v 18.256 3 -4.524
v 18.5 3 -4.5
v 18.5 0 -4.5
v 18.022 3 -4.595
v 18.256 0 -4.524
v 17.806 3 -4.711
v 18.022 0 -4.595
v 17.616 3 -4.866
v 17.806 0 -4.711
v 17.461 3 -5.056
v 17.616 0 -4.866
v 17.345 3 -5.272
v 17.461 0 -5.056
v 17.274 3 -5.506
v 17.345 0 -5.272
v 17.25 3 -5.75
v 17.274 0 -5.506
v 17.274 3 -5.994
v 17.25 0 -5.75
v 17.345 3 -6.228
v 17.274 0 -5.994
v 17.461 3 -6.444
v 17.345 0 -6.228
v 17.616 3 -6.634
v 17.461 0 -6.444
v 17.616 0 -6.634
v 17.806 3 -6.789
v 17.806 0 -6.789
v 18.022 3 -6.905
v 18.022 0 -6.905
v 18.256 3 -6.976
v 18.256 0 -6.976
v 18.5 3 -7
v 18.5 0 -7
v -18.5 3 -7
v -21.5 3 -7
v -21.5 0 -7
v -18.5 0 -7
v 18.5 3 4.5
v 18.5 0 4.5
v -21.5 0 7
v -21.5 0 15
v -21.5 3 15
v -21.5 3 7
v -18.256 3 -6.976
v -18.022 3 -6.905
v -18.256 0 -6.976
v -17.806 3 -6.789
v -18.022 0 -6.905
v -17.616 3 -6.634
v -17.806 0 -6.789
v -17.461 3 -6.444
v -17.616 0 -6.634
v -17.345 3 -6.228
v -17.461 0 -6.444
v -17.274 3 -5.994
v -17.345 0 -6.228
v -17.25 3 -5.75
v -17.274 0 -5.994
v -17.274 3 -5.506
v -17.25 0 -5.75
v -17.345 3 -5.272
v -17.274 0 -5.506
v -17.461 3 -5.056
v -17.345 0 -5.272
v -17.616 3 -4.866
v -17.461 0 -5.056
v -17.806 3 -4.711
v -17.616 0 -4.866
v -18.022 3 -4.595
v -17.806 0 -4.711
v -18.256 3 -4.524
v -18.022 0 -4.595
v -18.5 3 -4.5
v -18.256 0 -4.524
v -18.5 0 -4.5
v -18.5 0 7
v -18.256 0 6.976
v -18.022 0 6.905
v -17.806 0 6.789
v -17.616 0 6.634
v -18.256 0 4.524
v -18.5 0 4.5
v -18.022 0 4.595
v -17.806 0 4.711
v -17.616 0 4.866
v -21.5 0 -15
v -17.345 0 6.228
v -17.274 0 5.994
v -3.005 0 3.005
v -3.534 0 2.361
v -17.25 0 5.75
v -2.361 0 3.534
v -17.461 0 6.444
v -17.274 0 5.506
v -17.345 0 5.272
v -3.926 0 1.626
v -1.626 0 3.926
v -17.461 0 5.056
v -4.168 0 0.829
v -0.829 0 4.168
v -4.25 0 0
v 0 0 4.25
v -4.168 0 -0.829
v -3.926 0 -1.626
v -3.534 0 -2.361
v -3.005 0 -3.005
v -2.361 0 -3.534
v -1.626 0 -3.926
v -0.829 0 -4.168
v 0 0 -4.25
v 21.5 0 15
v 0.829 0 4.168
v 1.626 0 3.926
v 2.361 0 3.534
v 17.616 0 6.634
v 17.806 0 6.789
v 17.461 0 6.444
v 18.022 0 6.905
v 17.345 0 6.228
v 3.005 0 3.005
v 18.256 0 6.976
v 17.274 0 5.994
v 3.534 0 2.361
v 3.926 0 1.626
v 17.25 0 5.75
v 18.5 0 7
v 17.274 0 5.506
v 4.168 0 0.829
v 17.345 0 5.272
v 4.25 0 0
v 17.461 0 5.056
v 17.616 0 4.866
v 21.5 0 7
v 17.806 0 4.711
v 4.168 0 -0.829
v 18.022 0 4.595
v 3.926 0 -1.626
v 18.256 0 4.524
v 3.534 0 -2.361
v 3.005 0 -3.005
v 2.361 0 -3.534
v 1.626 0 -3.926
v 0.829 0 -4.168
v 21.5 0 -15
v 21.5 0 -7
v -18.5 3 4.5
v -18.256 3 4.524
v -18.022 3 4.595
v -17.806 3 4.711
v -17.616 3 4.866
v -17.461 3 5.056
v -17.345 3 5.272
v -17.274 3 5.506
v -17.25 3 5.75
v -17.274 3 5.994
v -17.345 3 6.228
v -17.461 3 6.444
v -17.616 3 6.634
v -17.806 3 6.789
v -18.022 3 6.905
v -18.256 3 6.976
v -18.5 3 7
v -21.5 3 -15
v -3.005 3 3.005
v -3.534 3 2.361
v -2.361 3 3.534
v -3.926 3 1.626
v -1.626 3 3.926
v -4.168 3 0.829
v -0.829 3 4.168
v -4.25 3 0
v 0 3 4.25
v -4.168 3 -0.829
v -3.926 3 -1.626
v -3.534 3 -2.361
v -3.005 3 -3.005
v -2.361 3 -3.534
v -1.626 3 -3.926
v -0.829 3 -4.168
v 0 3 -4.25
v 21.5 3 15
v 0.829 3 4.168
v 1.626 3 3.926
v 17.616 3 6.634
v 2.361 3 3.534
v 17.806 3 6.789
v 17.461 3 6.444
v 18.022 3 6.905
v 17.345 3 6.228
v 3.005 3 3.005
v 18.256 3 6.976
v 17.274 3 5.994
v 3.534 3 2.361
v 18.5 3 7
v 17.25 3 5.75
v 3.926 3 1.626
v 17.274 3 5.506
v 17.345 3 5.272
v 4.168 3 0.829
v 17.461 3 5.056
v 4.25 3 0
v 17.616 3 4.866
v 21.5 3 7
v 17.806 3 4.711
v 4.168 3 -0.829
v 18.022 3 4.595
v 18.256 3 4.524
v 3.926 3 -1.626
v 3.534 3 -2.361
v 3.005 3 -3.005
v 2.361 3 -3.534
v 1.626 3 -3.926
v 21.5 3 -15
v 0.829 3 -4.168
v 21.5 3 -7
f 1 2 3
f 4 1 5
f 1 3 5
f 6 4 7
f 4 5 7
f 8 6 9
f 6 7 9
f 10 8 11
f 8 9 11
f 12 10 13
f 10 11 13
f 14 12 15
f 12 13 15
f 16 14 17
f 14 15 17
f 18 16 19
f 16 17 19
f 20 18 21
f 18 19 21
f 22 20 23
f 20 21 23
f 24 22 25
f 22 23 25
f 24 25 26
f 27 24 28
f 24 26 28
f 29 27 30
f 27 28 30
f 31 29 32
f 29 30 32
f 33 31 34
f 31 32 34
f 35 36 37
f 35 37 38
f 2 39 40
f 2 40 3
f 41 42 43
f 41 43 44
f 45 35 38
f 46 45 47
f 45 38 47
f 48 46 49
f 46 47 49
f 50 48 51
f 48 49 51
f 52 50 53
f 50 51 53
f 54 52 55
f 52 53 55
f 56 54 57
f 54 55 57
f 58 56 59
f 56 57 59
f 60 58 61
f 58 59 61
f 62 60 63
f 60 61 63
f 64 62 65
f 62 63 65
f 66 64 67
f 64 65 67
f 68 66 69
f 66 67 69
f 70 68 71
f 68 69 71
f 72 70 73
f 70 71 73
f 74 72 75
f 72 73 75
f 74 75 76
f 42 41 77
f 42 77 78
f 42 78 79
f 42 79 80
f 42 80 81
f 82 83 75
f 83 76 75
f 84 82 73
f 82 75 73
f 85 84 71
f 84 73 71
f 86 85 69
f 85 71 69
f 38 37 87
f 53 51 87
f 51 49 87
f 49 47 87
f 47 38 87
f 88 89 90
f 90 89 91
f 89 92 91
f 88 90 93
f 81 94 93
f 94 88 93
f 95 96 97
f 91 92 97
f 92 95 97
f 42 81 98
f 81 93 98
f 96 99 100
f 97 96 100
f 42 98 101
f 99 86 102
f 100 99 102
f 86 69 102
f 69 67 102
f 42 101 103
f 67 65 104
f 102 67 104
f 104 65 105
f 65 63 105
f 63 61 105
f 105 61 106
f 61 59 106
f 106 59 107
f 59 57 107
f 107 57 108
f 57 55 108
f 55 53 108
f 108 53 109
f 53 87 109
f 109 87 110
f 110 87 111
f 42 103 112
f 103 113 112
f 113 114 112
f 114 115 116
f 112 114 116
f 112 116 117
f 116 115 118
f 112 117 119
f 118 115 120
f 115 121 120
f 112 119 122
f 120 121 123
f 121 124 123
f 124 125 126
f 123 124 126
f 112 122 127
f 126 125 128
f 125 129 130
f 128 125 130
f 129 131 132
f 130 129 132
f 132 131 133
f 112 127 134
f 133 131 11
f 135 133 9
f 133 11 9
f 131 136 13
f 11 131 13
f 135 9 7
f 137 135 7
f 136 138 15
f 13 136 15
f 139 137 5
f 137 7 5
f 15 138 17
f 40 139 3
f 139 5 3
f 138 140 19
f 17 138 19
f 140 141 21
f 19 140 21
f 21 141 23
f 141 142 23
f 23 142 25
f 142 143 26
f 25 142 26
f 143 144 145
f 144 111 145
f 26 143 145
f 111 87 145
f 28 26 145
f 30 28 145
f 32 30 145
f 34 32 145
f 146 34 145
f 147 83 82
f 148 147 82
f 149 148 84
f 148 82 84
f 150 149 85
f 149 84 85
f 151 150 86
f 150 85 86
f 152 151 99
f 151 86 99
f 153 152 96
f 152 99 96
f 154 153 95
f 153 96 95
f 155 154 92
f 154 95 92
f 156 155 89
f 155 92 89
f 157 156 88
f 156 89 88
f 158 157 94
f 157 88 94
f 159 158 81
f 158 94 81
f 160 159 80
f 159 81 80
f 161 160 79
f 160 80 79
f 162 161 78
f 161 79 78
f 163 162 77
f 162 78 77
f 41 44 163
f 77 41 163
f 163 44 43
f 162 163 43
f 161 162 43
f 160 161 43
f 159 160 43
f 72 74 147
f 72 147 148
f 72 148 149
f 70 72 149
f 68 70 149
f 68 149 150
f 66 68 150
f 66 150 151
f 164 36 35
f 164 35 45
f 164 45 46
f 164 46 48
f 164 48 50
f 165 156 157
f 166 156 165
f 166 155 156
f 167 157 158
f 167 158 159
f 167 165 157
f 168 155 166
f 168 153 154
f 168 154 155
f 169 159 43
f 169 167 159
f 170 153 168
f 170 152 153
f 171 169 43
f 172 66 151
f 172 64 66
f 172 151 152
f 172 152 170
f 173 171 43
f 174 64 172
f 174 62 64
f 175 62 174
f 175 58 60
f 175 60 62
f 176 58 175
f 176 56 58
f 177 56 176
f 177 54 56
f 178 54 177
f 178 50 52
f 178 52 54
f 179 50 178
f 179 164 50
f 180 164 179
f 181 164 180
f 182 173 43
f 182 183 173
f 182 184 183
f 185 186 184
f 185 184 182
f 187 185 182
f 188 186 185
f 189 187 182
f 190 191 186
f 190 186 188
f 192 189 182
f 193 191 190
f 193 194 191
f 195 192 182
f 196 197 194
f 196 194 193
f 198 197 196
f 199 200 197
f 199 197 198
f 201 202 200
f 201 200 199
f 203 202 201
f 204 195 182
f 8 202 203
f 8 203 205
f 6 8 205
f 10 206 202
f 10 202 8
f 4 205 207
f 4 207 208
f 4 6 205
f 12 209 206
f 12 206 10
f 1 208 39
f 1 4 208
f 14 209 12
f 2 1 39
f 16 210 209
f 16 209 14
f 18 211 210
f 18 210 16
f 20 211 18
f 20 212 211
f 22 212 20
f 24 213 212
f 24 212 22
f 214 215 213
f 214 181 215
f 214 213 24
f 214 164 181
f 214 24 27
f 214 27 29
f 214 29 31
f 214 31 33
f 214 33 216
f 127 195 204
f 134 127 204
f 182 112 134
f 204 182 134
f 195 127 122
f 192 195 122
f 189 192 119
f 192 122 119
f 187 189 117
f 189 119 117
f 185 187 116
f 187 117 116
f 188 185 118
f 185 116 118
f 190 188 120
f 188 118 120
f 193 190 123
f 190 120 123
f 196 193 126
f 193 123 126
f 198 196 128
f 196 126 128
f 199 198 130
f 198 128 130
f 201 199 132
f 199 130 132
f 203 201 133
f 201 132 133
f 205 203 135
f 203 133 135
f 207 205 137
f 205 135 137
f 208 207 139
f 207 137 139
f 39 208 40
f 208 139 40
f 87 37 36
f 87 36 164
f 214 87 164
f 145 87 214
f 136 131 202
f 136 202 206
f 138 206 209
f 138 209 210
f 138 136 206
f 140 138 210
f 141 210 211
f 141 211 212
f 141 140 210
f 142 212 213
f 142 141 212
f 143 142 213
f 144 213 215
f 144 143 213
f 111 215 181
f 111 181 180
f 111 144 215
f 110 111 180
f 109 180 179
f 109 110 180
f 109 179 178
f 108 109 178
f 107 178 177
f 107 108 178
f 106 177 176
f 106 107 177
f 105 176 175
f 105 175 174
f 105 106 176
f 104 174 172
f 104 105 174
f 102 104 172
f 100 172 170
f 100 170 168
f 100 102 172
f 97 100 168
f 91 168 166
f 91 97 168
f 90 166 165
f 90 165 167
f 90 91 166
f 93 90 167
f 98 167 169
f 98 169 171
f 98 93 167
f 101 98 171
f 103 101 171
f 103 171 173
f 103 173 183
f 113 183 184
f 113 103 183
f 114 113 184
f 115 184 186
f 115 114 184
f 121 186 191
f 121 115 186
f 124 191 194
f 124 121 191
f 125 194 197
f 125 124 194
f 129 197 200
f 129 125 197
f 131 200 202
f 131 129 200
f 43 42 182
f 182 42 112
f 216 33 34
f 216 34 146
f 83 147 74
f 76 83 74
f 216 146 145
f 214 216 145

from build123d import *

# Parameters (mm, degrees)
SKETCH_1_W          = 43
SKETCH_1_H          = 30
SKETCH_1_R          = 4.25
EXTRUDE_1_DEPTH     = 3
SKETCH_2_W          = 6
SKETCH_2_H          = 14
CUT_EXTRUDE_1_DEPTH = 3
CUT_EXTRUDE_2_REACH = 5
SKETCH_3_R          = 1.25


with BuildPart() as part:
    # 草图1 → 凸台-拉伸1 (new body)
    with BuildSketch(Plane(origin=(0, 0, 0), x_dir=(1, 0, 0), z_dir=(0, 1, 0))):
        Rectangle(SKETCH_1_W, SKETCH_1_H)
        Circle(SKETCH_1_R, mode=Mode.SUBTRACT)
    extrude(amount=EXTRUDE_1_DEPTH)

    # 草图2 → 切除-拉伸1 (cut)
    with BuildSketch(Plane(origin=(0, 3, 0), x_dir=(1, 0, 0), z_dir=(0, 1, 0))):
        with Locations((21.5, 0)):
            Rectangle(SKETCH_2_W, SKETCH_2_H)
        with Locations((-21.5, 0)):
            Rectangle(SKETCH_2_W, SKETCH_2_H)
    extrude(amount=-CUT_EXTRUDE_1_DEPTH, mode=Mode.SUBTRACT)

    # 草图3 → 切除-拉伸2 (cut, up to next)
    with BuildSketch(Plane.XZ, mode=Mode.PRIVATE) as cut_extrude_2_sk1:
        with Locations((-18.5, 5.75)):
            Circle(SKETCH_3_R)
    cut_extrude_2_tool1 = extrude(cut_extrude_2_sk1.sketch, amount=-CUT_EXTRUDE_2_REACH, mode=Mode.PRIVATE) & part.part
    add(cut_extrude_2_tool1.solids().sort_by_distance((-18.5, 0, 5.75))[0], mode=Mode.SUBTRACT)
    # 草图3 → 切除-拉伸2 (cut, up to next)
    with BuildSketch(Plane.XZ, mode=Mode.PRIVATE) as cut_extrude_2_sk2:
        with Locations((-18.5, -5.75)):
            Circle(SKETCH_3_R)
    cut_extrude_2_tool2 = extrude(cut_extrude_2_sk2.sketch, amount=-CUT_EXTRUDE_2_REACH, mode=Mode.PRIVATE) & part.part
    add(cut_extrude_2_tool2.solids().sort_by_distance((-18.5, 0, -5.75))[0], mode=Mode.SUBTRACT)
    # 草图3 → 切除-拉伸2 (cut, up to next)
    with BuildSketch(Plane.XZ, mode=Mode.PRIVATE) as cut_extrude_2_sk3:
        with Locations((18.5, -5.75)):
            Circle(SKETCH_3_R)
    cut_extrude_2_tool3 = extrude(cut_extrude_2_sk3.sketch, amount=-CUT_EXTRUDE_2_REACH, mode=Mode.PRIVATE) & part.part
    add(cut_extrude_2_tool3.solids().sort_by_distance((18.5, 0, -5.75))[0], mode=Mode.SUBTRACT)
    # 草图3 → 切除-拉伸2 (cut, up to next)
    with BuildSketch(Plane.XZ, mode=Mode.PRIVATE) as cut_extrude_2_sk4:
        with Locations((18.5, 5.75)):
            Circle(SKETCH_3_R)
    cut_extrude_2_tool4 = extrude(cut_extrude_2_sk4.sketch, amount=-CUT_EXTRUDE_2_REACH, mode=Mode.PRIVATE) & part.part
    add(cut_extrude_2_tool4.solids().sort_by_distance((18.5, 0, 5.75))[0], mode=Mode.SUBTRACT)


solid = part.part
